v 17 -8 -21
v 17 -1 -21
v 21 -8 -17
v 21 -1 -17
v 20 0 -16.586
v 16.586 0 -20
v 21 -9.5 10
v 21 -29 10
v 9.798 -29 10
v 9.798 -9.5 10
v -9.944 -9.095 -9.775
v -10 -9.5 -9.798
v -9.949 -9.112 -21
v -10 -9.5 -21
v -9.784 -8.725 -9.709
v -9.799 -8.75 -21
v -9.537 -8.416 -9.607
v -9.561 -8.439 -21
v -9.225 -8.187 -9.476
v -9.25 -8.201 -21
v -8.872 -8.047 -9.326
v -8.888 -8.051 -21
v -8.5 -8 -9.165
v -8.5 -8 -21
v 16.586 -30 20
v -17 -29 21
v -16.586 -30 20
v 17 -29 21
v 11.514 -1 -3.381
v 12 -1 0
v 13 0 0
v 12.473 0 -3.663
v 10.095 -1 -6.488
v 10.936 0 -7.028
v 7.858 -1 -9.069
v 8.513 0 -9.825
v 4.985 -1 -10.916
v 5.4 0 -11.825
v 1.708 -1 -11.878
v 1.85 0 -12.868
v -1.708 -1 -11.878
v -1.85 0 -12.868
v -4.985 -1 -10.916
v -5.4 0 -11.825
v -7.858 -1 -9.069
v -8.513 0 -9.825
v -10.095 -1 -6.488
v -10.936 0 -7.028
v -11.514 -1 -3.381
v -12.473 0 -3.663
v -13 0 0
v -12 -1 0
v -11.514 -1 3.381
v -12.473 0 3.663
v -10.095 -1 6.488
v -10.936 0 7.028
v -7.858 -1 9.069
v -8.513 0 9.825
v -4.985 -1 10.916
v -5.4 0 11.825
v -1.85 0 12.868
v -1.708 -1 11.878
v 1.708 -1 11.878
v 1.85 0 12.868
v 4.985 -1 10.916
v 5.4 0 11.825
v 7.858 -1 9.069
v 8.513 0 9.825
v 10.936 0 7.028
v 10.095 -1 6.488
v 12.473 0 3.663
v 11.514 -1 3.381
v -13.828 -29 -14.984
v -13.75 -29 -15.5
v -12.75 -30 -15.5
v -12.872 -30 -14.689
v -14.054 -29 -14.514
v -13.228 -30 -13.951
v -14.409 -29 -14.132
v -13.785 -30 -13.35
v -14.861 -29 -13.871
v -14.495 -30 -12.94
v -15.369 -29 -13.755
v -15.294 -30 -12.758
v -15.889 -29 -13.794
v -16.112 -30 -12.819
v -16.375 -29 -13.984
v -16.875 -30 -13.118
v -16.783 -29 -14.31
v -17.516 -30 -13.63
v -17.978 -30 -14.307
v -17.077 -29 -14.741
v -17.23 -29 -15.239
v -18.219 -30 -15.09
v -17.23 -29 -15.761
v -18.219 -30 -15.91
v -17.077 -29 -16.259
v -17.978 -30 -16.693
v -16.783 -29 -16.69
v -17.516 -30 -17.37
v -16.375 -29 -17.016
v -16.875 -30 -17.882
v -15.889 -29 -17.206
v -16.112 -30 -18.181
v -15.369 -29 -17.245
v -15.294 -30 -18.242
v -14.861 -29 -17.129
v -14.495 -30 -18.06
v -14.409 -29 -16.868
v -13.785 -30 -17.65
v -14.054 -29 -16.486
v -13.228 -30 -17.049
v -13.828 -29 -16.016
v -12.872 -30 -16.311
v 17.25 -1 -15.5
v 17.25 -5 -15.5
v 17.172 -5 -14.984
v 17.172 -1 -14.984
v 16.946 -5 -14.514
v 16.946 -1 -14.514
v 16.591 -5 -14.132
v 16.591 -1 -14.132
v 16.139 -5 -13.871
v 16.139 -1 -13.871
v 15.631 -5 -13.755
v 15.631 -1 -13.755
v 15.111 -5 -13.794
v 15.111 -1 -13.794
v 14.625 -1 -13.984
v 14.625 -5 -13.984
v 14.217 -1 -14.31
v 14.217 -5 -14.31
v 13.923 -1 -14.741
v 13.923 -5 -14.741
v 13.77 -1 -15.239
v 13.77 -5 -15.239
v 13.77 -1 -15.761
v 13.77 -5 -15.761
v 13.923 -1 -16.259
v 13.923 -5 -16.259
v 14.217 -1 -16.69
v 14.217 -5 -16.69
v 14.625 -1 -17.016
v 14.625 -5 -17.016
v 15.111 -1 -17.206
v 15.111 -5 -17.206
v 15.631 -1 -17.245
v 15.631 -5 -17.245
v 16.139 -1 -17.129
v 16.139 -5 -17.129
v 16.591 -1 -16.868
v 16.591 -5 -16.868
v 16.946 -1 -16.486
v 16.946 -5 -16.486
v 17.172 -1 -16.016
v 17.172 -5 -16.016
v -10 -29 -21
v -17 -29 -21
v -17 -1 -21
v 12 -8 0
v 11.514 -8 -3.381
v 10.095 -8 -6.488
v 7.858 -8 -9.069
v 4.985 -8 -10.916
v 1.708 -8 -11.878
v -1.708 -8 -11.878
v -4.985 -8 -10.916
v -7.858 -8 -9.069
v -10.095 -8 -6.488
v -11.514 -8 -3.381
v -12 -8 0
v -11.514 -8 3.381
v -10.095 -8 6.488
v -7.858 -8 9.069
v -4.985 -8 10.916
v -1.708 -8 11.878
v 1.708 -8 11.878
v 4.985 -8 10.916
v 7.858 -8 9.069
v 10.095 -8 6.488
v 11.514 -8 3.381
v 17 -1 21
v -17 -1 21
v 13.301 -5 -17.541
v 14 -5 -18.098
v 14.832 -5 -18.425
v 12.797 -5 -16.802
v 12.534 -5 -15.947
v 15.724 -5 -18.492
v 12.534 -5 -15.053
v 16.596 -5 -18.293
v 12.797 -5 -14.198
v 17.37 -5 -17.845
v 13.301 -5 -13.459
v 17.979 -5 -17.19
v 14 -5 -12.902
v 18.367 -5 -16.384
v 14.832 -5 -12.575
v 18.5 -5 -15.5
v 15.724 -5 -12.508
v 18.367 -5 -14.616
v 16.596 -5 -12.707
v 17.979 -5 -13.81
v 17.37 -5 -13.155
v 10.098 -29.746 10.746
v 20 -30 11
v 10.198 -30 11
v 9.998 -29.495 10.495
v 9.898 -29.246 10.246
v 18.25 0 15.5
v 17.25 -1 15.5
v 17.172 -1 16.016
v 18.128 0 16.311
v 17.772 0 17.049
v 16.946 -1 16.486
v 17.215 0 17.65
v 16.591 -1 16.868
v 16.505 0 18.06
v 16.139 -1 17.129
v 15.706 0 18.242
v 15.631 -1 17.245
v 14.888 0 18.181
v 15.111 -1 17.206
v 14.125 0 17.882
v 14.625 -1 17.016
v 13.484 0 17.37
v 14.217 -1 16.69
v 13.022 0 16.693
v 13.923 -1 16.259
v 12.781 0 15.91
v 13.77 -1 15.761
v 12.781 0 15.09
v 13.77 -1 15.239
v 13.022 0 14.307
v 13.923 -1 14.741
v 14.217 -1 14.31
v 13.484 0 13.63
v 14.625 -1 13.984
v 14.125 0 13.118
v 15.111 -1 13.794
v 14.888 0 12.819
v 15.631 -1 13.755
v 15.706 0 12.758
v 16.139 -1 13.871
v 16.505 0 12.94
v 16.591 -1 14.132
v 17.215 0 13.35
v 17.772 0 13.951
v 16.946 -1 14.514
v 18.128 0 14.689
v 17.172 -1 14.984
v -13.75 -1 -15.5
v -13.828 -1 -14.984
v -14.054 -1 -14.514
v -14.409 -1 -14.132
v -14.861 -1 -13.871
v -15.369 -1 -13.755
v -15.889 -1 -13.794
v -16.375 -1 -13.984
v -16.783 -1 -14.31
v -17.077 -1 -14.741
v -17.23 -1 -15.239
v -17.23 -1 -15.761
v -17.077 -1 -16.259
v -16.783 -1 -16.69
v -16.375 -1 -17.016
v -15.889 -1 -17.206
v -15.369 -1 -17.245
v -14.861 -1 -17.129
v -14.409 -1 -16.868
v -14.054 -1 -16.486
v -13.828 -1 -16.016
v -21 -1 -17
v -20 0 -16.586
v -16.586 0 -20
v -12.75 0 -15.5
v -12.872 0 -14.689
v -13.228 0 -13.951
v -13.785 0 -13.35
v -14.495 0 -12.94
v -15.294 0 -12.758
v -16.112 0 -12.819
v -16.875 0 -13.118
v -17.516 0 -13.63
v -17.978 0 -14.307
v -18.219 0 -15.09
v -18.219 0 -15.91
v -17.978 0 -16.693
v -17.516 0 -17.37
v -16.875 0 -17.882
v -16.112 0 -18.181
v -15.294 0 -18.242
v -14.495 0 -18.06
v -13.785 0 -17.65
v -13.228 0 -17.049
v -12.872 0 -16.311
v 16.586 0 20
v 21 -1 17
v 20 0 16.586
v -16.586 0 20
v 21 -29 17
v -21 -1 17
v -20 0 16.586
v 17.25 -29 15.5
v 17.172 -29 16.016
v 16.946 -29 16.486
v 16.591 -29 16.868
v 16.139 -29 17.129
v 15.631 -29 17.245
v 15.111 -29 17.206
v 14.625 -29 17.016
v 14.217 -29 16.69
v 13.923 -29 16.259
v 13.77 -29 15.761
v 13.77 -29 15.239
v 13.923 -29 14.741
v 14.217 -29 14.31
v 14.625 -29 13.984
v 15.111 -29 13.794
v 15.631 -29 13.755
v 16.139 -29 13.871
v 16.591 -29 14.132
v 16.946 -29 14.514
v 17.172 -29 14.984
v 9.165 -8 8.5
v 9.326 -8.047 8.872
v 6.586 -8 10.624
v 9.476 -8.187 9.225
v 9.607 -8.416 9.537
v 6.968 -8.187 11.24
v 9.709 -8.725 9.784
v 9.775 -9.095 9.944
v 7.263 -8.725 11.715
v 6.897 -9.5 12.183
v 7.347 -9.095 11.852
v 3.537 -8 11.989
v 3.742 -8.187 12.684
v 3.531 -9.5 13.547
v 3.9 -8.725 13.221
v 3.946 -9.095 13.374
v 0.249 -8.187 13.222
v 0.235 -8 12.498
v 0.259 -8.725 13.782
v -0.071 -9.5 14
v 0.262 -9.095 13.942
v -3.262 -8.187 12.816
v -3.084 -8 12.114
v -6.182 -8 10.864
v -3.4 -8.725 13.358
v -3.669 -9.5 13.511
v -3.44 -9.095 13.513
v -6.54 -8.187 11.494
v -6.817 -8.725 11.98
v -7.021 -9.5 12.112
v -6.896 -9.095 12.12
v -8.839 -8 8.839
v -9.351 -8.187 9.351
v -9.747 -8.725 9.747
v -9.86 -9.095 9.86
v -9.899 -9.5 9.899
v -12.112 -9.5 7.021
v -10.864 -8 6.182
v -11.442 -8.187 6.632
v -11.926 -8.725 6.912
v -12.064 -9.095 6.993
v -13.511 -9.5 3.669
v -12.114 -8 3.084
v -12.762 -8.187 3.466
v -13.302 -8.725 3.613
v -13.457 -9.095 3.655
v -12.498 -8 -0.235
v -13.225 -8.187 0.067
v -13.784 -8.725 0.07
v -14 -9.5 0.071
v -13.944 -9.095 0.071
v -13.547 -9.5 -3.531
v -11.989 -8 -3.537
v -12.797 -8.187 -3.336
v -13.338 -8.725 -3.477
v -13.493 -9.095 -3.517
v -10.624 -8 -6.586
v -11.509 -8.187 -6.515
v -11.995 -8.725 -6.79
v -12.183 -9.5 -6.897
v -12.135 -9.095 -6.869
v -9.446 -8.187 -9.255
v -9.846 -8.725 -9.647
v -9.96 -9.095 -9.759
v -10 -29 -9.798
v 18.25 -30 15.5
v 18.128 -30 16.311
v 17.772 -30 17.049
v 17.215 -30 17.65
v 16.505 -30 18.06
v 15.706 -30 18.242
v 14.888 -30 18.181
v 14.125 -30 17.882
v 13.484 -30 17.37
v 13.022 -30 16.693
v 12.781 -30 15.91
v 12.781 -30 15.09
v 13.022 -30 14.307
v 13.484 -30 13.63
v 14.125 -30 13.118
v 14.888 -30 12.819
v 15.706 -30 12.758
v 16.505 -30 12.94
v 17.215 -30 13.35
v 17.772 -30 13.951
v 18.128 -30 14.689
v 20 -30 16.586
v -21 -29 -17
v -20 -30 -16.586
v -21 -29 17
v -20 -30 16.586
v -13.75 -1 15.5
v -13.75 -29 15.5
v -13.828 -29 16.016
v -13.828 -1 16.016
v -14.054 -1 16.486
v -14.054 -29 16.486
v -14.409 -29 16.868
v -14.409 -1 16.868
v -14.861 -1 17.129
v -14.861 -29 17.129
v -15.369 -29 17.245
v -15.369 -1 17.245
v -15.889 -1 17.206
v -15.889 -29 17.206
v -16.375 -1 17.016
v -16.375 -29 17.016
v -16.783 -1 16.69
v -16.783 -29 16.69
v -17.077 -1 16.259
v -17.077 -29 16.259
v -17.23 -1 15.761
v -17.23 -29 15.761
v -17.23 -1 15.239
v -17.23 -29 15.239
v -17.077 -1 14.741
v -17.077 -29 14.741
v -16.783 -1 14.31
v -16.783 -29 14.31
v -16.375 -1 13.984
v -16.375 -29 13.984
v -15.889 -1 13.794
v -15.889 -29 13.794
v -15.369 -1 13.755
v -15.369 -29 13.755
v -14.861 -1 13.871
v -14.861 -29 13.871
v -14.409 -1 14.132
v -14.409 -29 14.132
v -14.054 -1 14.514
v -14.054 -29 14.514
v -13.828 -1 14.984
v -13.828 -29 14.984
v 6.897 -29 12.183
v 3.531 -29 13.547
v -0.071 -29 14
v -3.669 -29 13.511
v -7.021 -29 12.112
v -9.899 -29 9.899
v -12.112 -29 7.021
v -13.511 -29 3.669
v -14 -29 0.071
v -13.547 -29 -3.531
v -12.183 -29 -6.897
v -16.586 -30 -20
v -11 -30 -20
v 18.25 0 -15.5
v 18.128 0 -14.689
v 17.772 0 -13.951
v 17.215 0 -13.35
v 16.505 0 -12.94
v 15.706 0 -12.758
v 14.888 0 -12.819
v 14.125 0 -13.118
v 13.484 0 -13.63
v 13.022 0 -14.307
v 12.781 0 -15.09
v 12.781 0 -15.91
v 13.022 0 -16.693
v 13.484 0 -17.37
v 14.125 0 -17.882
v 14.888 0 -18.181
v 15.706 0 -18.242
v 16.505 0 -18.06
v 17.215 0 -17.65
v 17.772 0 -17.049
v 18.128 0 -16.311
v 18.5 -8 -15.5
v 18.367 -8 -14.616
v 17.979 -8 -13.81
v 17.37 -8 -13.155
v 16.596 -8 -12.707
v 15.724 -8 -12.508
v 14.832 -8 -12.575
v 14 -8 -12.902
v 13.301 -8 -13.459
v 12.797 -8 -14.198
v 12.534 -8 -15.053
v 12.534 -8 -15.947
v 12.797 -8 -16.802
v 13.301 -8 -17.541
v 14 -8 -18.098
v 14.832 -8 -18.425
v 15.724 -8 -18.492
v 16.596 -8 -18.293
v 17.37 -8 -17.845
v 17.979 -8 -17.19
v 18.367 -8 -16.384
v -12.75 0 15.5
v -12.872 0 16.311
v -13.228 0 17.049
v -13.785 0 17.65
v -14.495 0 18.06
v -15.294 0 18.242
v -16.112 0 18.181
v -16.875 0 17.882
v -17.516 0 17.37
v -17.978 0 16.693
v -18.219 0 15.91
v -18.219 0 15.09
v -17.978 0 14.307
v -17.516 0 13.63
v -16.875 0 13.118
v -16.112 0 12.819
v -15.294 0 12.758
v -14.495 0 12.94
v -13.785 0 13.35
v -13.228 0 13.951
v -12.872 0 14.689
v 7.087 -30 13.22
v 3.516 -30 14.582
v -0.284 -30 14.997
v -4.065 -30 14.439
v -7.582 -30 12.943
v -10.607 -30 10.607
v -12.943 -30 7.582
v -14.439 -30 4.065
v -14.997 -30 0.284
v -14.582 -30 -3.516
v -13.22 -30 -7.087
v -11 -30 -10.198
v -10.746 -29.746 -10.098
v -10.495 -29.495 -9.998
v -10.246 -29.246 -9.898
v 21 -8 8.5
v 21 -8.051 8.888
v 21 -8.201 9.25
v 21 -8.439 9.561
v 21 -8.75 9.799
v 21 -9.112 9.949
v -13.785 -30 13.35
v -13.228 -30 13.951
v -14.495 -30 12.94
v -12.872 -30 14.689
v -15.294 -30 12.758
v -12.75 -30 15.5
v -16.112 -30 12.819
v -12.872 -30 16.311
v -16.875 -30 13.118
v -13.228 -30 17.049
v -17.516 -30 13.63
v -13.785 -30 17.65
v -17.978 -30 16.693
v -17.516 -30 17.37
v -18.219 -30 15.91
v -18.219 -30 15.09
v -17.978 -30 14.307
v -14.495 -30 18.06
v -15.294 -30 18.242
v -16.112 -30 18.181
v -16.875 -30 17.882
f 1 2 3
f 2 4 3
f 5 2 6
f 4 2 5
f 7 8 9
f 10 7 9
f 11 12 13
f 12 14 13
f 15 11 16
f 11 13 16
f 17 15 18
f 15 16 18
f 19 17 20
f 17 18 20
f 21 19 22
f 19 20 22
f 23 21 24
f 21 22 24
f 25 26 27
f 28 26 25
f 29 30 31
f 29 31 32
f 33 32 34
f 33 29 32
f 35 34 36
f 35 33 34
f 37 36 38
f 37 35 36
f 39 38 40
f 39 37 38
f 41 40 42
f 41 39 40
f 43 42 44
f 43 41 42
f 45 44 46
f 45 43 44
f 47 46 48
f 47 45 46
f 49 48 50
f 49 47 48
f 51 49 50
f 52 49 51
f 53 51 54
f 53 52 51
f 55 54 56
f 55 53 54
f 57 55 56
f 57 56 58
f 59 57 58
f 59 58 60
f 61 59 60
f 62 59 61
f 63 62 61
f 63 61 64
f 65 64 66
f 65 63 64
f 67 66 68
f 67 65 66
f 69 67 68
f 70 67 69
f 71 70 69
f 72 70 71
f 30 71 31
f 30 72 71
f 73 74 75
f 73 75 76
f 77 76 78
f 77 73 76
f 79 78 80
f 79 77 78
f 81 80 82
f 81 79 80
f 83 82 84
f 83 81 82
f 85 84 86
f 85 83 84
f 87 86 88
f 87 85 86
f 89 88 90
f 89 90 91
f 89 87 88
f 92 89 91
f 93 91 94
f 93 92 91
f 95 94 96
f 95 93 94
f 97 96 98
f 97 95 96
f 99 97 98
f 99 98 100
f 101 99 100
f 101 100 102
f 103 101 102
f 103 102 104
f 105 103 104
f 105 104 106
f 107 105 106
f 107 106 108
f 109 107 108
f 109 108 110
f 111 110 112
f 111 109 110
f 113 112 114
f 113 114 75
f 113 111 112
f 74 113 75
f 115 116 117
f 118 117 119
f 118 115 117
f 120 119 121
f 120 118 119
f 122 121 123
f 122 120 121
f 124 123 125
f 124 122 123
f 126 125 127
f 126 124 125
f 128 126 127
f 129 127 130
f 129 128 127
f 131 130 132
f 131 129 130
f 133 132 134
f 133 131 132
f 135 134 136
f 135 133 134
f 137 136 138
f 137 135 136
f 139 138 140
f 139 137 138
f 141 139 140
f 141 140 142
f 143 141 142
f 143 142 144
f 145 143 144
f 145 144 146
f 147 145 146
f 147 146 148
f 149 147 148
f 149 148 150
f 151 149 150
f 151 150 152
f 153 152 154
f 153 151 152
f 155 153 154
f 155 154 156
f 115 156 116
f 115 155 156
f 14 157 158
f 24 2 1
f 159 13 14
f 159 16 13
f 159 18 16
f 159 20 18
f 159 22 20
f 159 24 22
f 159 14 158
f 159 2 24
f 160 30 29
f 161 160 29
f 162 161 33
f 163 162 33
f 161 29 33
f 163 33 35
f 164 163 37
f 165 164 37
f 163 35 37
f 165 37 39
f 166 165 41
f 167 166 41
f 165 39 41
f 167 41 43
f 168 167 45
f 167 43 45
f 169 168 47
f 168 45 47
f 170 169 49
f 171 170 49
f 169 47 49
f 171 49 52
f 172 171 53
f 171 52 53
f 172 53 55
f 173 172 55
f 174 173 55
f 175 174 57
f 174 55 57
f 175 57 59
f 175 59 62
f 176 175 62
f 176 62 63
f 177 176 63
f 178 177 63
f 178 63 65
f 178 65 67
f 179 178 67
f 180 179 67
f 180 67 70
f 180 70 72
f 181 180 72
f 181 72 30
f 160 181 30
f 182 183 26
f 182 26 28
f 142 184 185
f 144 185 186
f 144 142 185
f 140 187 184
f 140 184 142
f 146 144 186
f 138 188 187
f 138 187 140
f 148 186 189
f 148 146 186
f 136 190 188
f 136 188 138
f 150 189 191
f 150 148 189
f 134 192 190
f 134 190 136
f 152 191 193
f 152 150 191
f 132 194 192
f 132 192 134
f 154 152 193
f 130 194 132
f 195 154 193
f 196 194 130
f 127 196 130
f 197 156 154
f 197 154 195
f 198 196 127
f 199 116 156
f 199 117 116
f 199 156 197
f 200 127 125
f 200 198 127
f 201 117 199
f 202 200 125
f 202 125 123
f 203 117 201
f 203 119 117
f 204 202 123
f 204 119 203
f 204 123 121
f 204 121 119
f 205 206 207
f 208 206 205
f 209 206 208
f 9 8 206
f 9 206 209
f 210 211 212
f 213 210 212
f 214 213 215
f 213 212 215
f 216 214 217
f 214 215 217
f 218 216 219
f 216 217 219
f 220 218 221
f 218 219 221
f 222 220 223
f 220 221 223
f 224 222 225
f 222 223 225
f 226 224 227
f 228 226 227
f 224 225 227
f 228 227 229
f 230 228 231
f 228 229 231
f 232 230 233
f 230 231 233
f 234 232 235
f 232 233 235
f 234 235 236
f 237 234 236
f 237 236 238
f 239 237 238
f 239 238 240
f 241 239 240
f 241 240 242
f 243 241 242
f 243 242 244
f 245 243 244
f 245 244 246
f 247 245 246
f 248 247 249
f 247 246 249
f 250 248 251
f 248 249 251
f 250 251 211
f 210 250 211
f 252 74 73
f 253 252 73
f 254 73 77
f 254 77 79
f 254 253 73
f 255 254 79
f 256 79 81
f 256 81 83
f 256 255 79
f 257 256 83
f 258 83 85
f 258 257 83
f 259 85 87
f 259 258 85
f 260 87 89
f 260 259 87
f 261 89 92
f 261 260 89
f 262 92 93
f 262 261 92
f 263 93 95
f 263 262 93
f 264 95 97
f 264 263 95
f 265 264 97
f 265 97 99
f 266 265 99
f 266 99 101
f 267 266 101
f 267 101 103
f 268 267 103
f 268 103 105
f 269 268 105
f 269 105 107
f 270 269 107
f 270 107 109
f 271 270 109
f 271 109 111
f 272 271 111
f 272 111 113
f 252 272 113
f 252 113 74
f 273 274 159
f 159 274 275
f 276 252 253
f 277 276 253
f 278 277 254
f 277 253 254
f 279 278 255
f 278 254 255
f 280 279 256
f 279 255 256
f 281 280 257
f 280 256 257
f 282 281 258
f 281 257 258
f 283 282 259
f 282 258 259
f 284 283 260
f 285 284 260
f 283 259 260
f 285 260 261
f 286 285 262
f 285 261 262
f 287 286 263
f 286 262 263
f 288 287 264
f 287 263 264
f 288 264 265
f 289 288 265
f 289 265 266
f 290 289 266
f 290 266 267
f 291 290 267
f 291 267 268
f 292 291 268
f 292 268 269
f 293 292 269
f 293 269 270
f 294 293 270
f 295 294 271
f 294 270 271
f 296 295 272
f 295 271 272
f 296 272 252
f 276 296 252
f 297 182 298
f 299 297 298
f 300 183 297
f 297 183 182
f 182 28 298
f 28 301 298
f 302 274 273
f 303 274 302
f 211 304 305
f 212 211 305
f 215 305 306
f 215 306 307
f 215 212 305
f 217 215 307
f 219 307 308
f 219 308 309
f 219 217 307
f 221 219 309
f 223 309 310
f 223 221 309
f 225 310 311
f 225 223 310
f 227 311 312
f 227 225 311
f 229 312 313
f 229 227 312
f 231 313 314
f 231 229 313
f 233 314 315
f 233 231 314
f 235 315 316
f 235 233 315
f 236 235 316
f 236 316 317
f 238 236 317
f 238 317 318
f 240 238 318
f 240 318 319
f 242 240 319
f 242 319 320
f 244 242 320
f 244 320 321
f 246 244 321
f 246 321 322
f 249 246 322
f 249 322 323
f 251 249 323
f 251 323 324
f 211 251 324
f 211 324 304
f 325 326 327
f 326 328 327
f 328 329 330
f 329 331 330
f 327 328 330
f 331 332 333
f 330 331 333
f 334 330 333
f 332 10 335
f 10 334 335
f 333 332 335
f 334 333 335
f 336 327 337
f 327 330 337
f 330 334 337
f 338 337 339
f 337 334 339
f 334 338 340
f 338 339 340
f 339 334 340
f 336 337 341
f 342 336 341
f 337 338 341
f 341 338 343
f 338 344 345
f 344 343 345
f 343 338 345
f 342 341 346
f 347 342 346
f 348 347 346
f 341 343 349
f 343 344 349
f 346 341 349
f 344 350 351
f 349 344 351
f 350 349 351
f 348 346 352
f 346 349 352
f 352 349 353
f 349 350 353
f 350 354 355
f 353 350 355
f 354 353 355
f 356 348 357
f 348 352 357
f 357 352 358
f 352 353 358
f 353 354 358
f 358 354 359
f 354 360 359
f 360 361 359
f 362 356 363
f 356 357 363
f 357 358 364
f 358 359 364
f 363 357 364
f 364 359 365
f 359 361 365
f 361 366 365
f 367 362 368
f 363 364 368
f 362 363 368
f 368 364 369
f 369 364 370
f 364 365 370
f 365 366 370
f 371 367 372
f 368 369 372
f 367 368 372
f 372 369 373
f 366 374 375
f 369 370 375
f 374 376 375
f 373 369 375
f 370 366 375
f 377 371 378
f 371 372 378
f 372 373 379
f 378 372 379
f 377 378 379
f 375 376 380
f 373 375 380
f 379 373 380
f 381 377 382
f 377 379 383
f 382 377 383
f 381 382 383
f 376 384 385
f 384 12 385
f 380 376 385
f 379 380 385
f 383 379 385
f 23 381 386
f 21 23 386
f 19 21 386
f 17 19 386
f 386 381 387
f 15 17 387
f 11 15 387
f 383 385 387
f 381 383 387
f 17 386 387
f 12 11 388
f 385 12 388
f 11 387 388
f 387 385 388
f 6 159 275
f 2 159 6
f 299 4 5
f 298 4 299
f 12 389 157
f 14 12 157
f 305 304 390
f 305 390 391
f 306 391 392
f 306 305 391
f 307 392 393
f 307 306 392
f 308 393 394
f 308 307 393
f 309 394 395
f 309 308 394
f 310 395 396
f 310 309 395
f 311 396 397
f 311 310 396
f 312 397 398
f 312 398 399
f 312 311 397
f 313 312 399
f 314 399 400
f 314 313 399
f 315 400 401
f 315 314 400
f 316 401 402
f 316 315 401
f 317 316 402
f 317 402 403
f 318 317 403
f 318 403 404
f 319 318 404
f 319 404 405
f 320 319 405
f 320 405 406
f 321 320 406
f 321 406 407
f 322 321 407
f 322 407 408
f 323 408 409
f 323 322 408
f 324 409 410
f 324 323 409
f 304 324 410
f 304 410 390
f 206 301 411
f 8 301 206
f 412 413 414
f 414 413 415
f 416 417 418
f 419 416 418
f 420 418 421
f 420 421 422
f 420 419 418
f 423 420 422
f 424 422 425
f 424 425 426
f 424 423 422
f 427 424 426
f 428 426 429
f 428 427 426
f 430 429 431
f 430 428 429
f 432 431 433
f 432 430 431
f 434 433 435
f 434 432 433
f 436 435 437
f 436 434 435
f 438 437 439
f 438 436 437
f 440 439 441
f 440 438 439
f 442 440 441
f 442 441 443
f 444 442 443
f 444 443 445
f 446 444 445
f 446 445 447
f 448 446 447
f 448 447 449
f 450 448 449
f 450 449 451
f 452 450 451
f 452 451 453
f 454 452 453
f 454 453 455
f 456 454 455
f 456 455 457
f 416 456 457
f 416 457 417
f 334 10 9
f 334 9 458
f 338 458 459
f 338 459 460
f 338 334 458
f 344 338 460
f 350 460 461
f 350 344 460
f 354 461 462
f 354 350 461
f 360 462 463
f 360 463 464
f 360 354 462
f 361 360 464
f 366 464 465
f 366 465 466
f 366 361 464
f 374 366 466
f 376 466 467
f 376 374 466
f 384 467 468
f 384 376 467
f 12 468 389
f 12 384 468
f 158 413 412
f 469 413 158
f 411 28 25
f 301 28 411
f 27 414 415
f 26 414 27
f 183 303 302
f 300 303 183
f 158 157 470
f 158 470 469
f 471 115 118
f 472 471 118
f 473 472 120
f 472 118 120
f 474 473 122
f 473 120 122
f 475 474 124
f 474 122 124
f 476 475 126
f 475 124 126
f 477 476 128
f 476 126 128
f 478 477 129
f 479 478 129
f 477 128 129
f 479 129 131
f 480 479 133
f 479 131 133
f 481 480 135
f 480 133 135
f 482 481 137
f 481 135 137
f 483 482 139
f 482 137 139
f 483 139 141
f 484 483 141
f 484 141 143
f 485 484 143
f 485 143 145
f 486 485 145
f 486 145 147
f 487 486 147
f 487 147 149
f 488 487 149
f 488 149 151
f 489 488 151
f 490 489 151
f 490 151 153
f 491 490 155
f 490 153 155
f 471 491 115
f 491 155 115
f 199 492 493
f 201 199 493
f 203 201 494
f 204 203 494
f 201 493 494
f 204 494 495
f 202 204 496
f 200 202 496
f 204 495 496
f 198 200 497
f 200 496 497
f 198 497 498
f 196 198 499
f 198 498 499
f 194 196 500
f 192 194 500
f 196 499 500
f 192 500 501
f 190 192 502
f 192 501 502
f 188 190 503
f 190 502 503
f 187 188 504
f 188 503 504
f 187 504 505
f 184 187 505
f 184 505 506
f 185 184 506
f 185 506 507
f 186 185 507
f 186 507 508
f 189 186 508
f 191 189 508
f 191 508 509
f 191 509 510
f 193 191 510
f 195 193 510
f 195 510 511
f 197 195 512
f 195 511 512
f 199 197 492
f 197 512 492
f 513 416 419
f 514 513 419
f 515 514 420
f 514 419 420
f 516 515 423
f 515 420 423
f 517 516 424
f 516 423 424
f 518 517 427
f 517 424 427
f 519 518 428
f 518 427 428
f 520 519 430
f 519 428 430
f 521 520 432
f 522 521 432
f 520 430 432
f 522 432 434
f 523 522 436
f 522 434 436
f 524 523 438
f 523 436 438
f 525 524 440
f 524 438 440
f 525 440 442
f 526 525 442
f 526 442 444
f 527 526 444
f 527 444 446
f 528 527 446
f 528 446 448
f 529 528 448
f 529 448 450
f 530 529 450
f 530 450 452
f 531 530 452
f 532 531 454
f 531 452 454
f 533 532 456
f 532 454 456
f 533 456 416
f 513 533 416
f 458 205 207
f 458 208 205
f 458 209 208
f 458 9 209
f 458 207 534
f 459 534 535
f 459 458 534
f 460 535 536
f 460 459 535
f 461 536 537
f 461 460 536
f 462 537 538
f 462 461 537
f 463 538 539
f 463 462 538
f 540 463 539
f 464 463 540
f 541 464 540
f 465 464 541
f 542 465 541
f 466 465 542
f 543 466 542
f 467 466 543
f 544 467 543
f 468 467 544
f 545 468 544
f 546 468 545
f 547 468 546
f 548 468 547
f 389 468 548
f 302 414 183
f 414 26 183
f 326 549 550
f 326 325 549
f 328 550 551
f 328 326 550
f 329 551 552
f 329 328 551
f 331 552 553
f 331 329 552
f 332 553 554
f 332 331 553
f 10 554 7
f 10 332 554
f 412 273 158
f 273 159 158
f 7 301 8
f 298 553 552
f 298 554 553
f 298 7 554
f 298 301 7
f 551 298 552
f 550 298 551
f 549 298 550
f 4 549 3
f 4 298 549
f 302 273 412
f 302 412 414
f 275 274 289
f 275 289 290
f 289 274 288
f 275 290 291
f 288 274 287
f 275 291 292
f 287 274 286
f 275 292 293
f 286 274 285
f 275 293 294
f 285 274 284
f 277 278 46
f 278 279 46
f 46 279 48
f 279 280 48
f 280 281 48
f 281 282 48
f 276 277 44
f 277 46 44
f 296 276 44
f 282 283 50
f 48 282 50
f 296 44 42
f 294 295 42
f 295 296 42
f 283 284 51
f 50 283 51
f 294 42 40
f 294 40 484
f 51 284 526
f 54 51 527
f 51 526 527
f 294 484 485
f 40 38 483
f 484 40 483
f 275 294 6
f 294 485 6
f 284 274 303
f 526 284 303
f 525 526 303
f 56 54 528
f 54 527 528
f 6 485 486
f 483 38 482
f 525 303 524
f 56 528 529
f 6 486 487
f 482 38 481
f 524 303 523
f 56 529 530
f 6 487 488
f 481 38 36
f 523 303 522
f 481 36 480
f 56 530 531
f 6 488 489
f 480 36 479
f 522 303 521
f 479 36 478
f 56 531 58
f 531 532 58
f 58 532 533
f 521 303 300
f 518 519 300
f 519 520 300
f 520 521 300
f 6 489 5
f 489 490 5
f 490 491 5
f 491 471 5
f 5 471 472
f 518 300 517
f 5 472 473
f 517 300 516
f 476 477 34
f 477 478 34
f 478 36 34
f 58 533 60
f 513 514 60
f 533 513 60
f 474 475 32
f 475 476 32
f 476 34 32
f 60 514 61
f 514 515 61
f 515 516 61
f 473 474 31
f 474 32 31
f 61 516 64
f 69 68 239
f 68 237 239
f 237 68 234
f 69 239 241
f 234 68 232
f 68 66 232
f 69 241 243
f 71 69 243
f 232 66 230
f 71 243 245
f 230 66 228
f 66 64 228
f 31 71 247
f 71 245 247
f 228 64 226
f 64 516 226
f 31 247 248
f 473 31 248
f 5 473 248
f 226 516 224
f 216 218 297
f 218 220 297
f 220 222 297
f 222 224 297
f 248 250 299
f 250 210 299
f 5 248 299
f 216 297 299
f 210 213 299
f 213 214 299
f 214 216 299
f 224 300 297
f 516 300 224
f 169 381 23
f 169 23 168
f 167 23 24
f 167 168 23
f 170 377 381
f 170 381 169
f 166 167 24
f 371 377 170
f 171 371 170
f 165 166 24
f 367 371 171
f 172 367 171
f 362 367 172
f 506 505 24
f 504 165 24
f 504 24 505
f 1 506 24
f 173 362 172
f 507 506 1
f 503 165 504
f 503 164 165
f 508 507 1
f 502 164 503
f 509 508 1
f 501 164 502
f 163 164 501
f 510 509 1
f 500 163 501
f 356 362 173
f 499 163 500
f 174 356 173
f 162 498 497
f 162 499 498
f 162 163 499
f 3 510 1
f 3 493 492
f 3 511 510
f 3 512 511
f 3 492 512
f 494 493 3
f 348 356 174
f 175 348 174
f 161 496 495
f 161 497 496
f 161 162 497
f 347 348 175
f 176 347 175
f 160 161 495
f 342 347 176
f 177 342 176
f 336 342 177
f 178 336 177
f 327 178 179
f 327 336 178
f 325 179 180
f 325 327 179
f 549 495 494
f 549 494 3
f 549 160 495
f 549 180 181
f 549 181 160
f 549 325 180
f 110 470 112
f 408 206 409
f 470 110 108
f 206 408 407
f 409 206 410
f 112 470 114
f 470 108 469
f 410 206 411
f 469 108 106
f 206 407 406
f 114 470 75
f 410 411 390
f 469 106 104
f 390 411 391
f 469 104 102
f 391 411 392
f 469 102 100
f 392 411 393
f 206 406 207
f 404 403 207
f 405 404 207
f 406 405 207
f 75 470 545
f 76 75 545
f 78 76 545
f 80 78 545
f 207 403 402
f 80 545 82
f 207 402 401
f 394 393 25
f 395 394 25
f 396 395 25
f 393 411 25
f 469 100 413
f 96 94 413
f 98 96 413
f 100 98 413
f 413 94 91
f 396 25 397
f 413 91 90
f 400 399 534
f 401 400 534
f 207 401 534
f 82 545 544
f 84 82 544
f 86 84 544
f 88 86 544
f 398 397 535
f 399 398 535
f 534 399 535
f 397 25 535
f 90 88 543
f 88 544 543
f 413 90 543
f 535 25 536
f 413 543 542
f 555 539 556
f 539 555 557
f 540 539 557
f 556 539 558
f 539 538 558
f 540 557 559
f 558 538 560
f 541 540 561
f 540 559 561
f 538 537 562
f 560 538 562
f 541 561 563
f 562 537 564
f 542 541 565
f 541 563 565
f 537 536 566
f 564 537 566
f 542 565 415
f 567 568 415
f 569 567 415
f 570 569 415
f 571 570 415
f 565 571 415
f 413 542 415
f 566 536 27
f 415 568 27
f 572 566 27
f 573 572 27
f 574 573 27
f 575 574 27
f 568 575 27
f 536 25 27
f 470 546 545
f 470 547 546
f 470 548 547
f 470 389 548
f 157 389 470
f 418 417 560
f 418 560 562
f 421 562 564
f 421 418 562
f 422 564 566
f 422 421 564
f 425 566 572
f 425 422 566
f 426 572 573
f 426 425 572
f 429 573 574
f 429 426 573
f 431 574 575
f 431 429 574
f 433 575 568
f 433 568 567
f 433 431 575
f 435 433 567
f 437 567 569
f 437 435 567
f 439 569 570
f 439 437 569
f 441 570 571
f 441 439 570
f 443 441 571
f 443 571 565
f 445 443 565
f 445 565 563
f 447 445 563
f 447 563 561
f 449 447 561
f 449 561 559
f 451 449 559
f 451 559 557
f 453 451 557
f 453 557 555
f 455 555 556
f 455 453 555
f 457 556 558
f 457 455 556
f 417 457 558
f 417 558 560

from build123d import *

# Parameters (mm, degrees)
SKETCH_W        = 42
SKETCH_H        = 42
SKETCH_R        = 1.75
PAD_DEPTH       = 8
SKETCH001_R     = 12
POCKET_DEPTH    = 8.001
SKETCH003_R     = 1.75
PAD001_DEPTH    = 22
SKETCH004_R     = 3
POCKET001_DEPTH = 3
CHAMFER_SIZE    = 4
CHAMFER001_SIZE = 1
CHAMFER002_SIZE = 1
FILLET_R        = 1.5


with BuildPart() as part:
    # Sketch → Pad (new body)
    with BuildSketch(Plane.XZ):
        Rectangle(SKETCH_W, SKETCH_H)
        with Locations((-15.5, -15.5)):
            Circle(SKETCH_R, mode=Mode.SUBTRACT)
        with Locations((15.5, -15.5)):
            Circle(SKETCH_R, mode=Mode.SUBTRACT)
        with Locations((-15.5, 15.5)):
            Circle(SKETCH_R, mode=Mode.SUBTRACT)
        with Locations((15.5, 15.5)):
            Circle(SKETCH_R, mode=Mode.SUBTRACT)
    extrude(amount=PAD_DEPTH)

    # Sketch001 (on Face9 of Pad) → Pocket (cut, through all)
    with BuildSketch(Plane(origin=(0, 0, 0), x_dir=(1, 0, 0), z_dir=(0, 1, 0))):
        Circle(SKETCH001_R)
    extrude(amount=-POCKET_DEPTH, mode=Mode.SUBTRACT)

    # Sketch003 → Pad001 (join)
    with BuildSketch(Plane.XZ.offset(8)):
        with BuildLine():
            Line((-21, -21), (-21, 21))
            Line((-21, 21), (21, 21))
            Line((21, 21), (21, 10))
            Line((21, 10), (9.797959, 10))
            ThreePointArc((9.797959, 10), (-9.899495, 9.899495), (-10, -9.797959))
            Line((-10, -9.797959), (-10, -21))
            Line((-10, -21), (-21, -21))
        make_face()
        with Locations((-15.5, 15.5)):
            Circle(SKETCH003_R, mode=Mode.SUBTRACT)
        with Locations((-15.5, -15.5)):
            Circle(SKETCH003_R, mode=Mode.SUBTRACT)
        with Locations((15.5, 15.5)):
            Circle(SKETCH003_R, mode=Mode.SUBTRACT)
    extrude(amount=PAD001_DEPTH)

    # Sketch004 (on Face9 of Pad001) → Pocket001 (cut)
    with BuildSketch(Plane.XZ.offset(8)):
        with Locations((15.5, -15.5)):
            Circle(SKETCH004_R)
    extrude(amount=-POCKET001_DEPTH, mode=Mode.SUBTRACT)

    # Chamfer
    chamfer_edges = [part.edges().sort_by_distance(p)[0] for p in [
        (21, -4, -21),
        (21, -4, 21),
        (-21, -4, 21),
        (-21, -4, -21),
    ]]
    chamfer(chamfer_edges, length=CHAMFER_SIZE)

    # Chamfer001
    chamfer001_edges = [part.edges().sort_by_distance(p)[0] for p in [
        (0, 0, 21),
        (-19, 0, 19),
        (19, 0, 19),
        (-21, 0, 0),
        (21, 0, 0),
        (-19, 0, -19),
        (19, 0, -19),
        (0, 0, -21),
        (13.75, 0, -15.5),
        (-12, 0, 0),
        (-17.25, 0, -15.5),
        (-17.25, 0, 15.5),
        (13.75, 0, 15.5),
    ]]
    chamfer(chamfer001_edges, length=CHAMFER001_SIZE)

    # Chamfer002
    chamfer002_edges = [part.edges().sort_by_distance(p)[0] for p in [
        (-21, -30, 0),
        (-19, -30, -19),
        (-19, -30, 19),
        (-13.5, -30, -21),
        (0, -30, 21),
        (-10, -30, -15.398979),
        (19, -30, 19),
        (-9.899495, -30, 9.899495),
        (21, -30, 13.5),
        (15.398979, -30, 10),
        (13.75, -30, 15.5),
        (-17.25, -30, -15.5),
        (-17.25, -30, 15.5),
    ]]
    chamfer(chamfer002_edges, length=CHAMFER002_SIZE)

    # Fillet
    fillet_edges = [part.edges().sort_by_distance(p)[0] for p in [
        (-9.899495, -8, 9.899495),
        (15.398979, -8, 10),
        (-10, -8, -15.398979),
    ]]
    fillet(fillet_edges, radius=FILLET_R)


solid = part.part
